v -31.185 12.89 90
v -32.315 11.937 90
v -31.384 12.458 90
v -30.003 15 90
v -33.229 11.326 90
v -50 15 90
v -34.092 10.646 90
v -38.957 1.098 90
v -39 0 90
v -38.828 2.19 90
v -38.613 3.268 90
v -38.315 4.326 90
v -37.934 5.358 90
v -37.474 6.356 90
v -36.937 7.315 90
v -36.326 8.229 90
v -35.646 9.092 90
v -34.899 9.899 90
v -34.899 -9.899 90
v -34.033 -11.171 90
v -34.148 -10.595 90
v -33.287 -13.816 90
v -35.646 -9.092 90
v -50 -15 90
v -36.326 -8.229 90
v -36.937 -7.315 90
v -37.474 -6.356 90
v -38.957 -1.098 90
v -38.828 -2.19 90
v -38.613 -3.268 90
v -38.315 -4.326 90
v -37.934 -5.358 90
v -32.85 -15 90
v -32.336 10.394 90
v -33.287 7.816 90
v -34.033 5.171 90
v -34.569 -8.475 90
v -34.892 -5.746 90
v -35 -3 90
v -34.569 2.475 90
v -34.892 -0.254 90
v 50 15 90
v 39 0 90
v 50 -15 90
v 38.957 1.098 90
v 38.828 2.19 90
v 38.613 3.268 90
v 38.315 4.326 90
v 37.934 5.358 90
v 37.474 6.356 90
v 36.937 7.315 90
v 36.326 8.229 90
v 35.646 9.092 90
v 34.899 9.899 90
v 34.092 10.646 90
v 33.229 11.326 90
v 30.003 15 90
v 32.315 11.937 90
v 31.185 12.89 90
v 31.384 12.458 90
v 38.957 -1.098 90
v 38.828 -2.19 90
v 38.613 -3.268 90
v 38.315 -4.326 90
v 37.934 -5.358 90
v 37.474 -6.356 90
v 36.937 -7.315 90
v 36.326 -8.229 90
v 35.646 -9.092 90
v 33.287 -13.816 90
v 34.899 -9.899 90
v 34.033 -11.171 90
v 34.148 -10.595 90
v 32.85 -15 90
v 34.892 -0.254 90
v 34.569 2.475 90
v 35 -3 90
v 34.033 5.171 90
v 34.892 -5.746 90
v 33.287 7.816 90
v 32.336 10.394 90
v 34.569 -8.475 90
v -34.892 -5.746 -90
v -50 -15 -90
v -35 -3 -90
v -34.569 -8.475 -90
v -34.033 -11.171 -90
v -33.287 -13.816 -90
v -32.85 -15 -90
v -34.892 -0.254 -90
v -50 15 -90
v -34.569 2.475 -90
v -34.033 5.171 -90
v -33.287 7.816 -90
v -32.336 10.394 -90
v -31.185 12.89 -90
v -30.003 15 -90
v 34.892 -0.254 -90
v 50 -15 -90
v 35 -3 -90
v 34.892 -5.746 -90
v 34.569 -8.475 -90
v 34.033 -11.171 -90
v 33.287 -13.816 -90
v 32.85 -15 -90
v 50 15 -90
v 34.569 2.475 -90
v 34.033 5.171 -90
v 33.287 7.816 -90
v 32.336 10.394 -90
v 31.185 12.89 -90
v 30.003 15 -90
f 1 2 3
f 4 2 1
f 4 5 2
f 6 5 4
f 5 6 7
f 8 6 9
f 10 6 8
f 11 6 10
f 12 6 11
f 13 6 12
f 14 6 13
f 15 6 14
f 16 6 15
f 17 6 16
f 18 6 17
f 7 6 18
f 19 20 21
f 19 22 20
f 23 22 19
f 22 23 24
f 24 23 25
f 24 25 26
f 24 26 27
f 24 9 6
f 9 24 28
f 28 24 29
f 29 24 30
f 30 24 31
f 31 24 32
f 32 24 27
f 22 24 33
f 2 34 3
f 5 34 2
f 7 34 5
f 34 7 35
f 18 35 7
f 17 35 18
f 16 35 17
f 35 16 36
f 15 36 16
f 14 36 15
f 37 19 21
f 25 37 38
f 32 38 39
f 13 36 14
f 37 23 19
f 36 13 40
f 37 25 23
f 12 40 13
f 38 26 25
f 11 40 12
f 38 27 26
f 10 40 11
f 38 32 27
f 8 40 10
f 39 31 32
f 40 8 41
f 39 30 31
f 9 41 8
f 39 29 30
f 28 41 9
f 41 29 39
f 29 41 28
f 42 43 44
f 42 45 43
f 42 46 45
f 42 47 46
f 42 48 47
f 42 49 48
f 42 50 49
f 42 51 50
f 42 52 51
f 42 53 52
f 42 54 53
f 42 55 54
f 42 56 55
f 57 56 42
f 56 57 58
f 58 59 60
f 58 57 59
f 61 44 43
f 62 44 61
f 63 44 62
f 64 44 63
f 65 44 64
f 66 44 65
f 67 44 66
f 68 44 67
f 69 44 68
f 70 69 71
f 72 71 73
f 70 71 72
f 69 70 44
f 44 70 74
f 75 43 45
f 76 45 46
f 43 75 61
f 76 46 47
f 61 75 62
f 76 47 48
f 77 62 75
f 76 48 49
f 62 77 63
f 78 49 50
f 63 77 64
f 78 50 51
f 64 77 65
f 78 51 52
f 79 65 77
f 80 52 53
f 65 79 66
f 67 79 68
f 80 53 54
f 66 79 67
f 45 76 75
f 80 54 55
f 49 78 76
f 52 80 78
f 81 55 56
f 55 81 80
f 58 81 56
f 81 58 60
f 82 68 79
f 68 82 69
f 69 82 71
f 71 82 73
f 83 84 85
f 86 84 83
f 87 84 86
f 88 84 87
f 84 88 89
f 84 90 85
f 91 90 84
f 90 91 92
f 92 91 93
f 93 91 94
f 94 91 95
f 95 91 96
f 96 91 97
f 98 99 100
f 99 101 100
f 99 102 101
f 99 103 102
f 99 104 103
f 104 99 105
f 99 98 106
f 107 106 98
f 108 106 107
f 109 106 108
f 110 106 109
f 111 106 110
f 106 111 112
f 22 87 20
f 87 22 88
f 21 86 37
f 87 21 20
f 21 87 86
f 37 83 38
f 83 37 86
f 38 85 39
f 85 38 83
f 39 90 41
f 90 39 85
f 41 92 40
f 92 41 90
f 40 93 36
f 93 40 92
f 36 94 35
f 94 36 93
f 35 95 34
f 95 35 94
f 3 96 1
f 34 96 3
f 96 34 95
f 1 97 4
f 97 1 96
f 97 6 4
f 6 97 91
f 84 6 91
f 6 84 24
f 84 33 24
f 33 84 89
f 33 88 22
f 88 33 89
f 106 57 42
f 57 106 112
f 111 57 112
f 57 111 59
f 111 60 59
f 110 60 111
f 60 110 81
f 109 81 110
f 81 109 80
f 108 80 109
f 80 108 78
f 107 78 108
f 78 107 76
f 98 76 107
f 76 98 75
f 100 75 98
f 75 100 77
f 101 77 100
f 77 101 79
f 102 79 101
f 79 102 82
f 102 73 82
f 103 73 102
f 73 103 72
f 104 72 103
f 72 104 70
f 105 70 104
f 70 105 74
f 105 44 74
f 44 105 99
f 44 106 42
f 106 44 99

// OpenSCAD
$fn = 80;

// Main body dimensions
body_width = 100;
body_height = 30;
body_length = 180;
arch_radius = 35;
arch_cut_depth = 12;

// Recess dimensions
recess_radius = 14;
recess_depth = 8;
recess_x_offset = 25;

// 2D cross-section profile module
module arched_profile() {
    difference() {
        // Base rectangular slab
        square([body_width, body_height], center=true);
        // Bottom arch void cutout
        translate([0, -body_height/2 + arch_cut_depth]) {
            circle(r=arch_radius);
        }
    }
}

// Paired circular recesses module
module top_recesses() {
    for (x_pos = [-recess_x_offset, recess_x_offset]) {
        translate([x_pos, 0, body_length/2]) {
            // Cylinder extends slightly past top face to ensure clean boolean subtraction
            cylinder(h=recess_depth + 0.2, r=recess_radius, center=false);
        }
    }
}

// Final model assembly
difference() {
    // Single solid extrusion of the arched profile
    linear_extrude(height=body_length, center=true) {
        arched_profile();
    }
    // Subtract paired circular recesses from the upper flat surface
    top_recesses();
}
